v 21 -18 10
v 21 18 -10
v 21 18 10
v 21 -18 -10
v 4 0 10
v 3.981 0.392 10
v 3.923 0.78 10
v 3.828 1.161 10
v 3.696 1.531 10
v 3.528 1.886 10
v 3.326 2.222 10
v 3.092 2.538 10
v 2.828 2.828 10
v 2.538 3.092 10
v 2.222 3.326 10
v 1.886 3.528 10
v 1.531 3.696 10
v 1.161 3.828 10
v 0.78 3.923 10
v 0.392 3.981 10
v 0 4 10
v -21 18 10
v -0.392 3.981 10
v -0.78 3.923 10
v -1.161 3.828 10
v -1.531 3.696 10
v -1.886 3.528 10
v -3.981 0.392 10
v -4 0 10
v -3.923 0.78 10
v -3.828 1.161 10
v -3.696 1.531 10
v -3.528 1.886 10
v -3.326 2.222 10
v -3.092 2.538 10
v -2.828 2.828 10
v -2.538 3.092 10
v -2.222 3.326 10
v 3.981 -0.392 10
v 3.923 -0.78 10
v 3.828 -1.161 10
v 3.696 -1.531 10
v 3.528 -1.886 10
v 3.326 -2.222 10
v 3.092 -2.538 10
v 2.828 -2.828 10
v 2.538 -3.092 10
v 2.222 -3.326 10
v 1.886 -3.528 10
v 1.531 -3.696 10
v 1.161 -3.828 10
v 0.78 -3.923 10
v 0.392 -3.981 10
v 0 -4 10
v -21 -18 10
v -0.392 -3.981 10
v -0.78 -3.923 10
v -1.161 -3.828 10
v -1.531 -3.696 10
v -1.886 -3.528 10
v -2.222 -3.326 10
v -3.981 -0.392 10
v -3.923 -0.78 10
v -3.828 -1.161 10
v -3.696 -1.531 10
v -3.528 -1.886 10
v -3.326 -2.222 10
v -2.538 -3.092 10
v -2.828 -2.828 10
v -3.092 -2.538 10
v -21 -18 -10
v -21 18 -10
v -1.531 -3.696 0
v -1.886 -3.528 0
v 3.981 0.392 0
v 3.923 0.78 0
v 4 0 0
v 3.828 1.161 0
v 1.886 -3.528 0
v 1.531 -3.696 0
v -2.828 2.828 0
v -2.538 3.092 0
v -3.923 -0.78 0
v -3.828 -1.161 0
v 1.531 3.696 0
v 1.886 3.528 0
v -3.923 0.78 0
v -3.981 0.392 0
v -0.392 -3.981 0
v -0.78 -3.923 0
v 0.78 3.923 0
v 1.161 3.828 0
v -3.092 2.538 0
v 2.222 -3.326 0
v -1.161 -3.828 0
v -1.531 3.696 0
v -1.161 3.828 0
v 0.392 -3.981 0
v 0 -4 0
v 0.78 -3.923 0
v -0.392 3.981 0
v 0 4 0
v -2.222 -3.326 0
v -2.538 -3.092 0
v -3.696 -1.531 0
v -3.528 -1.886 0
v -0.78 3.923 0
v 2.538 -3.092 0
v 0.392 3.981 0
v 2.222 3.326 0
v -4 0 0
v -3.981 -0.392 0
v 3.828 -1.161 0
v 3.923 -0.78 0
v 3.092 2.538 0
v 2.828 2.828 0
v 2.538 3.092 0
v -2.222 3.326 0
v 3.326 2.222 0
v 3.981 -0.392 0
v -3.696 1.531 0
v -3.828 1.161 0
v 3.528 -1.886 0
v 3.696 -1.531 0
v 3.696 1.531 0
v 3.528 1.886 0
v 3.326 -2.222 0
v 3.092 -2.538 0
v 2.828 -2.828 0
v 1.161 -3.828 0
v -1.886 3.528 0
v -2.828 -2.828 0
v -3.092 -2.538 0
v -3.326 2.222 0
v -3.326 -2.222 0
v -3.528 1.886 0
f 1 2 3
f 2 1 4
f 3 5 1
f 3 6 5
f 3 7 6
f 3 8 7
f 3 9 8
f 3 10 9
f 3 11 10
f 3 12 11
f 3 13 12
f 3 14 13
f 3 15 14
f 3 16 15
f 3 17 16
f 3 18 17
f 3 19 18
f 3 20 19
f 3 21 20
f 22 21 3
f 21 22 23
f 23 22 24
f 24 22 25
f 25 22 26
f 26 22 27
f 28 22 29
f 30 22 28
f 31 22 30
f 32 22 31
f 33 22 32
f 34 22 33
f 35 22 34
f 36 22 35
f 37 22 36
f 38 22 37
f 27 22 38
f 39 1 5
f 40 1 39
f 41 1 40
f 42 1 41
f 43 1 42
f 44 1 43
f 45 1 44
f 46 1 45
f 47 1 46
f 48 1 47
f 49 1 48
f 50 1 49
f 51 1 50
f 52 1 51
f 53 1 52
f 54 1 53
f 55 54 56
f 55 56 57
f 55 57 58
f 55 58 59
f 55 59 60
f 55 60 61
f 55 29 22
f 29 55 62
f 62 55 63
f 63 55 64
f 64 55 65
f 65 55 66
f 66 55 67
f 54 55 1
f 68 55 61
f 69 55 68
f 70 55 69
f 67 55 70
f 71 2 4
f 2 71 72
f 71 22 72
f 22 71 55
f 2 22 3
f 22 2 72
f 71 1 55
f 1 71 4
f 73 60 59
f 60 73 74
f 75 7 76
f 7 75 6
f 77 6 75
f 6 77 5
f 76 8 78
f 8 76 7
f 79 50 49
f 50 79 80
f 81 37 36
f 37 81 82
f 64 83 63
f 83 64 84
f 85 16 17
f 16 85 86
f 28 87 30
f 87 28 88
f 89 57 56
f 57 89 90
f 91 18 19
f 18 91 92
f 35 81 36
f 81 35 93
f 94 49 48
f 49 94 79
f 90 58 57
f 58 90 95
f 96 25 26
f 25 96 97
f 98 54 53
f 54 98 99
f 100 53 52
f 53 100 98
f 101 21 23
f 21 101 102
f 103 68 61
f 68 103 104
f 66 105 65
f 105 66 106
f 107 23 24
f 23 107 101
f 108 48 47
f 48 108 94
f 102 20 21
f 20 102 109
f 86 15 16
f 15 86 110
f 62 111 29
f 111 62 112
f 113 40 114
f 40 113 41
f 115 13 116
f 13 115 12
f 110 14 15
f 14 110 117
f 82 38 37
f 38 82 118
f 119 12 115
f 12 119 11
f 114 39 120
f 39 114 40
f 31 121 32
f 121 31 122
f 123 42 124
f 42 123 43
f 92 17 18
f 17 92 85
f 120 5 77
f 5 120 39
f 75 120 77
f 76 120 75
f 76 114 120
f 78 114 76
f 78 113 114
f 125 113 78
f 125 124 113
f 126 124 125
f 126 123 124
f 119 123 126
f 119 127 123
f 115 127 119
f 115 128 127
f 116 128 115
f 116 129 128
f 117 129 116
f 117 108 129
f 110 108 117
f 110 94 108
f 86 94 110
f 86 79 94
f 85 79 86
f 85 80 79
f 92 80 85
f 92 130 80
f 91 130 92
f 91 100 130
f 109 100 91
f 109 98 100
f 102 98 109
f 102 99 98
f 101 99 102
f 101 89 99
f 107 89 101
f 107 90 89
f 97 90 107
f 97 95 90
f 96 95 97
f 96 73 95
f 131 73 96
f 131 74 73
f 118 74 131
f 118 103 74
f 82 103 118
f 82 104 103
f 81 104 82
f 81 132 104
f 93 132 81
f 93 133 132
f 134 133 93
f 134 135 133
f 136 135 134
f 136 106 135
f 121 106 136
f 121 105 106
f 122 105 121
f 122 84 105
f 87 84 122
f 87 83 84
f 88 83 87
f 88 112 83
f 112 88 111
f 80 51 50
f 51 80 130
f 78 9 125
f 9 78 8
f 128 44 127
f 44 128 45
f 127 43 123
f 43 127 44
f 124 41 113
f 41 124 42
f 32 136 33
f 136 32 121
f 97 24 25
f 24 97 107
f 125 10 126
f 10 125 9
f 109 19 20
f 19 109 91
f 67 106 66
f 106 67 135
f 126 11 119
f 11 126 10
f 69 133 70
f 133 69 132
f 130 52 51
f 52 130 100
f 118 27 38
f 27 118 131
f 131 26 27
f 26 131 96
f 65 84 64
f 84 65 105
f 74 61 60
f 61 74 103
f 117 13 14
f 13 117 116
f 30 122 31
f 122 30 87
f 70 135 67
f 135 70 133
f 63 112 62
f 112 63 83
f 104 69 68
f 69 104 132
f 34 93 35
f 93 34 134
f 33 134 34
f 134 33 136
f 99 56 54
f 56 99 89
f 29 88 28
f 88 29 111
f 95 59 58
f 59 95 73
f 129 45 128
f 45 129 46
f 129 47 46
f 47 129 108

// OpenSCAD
module linear_bearing_block() {
    difference() {
        // Main block
        cube([42, 36, 20], center=true);
        
        // Shaft hole
        translate([0, 0, 0])
            cylinder(h=20, d=8, $fn=64);
    }
}

linear_bearing_block();
